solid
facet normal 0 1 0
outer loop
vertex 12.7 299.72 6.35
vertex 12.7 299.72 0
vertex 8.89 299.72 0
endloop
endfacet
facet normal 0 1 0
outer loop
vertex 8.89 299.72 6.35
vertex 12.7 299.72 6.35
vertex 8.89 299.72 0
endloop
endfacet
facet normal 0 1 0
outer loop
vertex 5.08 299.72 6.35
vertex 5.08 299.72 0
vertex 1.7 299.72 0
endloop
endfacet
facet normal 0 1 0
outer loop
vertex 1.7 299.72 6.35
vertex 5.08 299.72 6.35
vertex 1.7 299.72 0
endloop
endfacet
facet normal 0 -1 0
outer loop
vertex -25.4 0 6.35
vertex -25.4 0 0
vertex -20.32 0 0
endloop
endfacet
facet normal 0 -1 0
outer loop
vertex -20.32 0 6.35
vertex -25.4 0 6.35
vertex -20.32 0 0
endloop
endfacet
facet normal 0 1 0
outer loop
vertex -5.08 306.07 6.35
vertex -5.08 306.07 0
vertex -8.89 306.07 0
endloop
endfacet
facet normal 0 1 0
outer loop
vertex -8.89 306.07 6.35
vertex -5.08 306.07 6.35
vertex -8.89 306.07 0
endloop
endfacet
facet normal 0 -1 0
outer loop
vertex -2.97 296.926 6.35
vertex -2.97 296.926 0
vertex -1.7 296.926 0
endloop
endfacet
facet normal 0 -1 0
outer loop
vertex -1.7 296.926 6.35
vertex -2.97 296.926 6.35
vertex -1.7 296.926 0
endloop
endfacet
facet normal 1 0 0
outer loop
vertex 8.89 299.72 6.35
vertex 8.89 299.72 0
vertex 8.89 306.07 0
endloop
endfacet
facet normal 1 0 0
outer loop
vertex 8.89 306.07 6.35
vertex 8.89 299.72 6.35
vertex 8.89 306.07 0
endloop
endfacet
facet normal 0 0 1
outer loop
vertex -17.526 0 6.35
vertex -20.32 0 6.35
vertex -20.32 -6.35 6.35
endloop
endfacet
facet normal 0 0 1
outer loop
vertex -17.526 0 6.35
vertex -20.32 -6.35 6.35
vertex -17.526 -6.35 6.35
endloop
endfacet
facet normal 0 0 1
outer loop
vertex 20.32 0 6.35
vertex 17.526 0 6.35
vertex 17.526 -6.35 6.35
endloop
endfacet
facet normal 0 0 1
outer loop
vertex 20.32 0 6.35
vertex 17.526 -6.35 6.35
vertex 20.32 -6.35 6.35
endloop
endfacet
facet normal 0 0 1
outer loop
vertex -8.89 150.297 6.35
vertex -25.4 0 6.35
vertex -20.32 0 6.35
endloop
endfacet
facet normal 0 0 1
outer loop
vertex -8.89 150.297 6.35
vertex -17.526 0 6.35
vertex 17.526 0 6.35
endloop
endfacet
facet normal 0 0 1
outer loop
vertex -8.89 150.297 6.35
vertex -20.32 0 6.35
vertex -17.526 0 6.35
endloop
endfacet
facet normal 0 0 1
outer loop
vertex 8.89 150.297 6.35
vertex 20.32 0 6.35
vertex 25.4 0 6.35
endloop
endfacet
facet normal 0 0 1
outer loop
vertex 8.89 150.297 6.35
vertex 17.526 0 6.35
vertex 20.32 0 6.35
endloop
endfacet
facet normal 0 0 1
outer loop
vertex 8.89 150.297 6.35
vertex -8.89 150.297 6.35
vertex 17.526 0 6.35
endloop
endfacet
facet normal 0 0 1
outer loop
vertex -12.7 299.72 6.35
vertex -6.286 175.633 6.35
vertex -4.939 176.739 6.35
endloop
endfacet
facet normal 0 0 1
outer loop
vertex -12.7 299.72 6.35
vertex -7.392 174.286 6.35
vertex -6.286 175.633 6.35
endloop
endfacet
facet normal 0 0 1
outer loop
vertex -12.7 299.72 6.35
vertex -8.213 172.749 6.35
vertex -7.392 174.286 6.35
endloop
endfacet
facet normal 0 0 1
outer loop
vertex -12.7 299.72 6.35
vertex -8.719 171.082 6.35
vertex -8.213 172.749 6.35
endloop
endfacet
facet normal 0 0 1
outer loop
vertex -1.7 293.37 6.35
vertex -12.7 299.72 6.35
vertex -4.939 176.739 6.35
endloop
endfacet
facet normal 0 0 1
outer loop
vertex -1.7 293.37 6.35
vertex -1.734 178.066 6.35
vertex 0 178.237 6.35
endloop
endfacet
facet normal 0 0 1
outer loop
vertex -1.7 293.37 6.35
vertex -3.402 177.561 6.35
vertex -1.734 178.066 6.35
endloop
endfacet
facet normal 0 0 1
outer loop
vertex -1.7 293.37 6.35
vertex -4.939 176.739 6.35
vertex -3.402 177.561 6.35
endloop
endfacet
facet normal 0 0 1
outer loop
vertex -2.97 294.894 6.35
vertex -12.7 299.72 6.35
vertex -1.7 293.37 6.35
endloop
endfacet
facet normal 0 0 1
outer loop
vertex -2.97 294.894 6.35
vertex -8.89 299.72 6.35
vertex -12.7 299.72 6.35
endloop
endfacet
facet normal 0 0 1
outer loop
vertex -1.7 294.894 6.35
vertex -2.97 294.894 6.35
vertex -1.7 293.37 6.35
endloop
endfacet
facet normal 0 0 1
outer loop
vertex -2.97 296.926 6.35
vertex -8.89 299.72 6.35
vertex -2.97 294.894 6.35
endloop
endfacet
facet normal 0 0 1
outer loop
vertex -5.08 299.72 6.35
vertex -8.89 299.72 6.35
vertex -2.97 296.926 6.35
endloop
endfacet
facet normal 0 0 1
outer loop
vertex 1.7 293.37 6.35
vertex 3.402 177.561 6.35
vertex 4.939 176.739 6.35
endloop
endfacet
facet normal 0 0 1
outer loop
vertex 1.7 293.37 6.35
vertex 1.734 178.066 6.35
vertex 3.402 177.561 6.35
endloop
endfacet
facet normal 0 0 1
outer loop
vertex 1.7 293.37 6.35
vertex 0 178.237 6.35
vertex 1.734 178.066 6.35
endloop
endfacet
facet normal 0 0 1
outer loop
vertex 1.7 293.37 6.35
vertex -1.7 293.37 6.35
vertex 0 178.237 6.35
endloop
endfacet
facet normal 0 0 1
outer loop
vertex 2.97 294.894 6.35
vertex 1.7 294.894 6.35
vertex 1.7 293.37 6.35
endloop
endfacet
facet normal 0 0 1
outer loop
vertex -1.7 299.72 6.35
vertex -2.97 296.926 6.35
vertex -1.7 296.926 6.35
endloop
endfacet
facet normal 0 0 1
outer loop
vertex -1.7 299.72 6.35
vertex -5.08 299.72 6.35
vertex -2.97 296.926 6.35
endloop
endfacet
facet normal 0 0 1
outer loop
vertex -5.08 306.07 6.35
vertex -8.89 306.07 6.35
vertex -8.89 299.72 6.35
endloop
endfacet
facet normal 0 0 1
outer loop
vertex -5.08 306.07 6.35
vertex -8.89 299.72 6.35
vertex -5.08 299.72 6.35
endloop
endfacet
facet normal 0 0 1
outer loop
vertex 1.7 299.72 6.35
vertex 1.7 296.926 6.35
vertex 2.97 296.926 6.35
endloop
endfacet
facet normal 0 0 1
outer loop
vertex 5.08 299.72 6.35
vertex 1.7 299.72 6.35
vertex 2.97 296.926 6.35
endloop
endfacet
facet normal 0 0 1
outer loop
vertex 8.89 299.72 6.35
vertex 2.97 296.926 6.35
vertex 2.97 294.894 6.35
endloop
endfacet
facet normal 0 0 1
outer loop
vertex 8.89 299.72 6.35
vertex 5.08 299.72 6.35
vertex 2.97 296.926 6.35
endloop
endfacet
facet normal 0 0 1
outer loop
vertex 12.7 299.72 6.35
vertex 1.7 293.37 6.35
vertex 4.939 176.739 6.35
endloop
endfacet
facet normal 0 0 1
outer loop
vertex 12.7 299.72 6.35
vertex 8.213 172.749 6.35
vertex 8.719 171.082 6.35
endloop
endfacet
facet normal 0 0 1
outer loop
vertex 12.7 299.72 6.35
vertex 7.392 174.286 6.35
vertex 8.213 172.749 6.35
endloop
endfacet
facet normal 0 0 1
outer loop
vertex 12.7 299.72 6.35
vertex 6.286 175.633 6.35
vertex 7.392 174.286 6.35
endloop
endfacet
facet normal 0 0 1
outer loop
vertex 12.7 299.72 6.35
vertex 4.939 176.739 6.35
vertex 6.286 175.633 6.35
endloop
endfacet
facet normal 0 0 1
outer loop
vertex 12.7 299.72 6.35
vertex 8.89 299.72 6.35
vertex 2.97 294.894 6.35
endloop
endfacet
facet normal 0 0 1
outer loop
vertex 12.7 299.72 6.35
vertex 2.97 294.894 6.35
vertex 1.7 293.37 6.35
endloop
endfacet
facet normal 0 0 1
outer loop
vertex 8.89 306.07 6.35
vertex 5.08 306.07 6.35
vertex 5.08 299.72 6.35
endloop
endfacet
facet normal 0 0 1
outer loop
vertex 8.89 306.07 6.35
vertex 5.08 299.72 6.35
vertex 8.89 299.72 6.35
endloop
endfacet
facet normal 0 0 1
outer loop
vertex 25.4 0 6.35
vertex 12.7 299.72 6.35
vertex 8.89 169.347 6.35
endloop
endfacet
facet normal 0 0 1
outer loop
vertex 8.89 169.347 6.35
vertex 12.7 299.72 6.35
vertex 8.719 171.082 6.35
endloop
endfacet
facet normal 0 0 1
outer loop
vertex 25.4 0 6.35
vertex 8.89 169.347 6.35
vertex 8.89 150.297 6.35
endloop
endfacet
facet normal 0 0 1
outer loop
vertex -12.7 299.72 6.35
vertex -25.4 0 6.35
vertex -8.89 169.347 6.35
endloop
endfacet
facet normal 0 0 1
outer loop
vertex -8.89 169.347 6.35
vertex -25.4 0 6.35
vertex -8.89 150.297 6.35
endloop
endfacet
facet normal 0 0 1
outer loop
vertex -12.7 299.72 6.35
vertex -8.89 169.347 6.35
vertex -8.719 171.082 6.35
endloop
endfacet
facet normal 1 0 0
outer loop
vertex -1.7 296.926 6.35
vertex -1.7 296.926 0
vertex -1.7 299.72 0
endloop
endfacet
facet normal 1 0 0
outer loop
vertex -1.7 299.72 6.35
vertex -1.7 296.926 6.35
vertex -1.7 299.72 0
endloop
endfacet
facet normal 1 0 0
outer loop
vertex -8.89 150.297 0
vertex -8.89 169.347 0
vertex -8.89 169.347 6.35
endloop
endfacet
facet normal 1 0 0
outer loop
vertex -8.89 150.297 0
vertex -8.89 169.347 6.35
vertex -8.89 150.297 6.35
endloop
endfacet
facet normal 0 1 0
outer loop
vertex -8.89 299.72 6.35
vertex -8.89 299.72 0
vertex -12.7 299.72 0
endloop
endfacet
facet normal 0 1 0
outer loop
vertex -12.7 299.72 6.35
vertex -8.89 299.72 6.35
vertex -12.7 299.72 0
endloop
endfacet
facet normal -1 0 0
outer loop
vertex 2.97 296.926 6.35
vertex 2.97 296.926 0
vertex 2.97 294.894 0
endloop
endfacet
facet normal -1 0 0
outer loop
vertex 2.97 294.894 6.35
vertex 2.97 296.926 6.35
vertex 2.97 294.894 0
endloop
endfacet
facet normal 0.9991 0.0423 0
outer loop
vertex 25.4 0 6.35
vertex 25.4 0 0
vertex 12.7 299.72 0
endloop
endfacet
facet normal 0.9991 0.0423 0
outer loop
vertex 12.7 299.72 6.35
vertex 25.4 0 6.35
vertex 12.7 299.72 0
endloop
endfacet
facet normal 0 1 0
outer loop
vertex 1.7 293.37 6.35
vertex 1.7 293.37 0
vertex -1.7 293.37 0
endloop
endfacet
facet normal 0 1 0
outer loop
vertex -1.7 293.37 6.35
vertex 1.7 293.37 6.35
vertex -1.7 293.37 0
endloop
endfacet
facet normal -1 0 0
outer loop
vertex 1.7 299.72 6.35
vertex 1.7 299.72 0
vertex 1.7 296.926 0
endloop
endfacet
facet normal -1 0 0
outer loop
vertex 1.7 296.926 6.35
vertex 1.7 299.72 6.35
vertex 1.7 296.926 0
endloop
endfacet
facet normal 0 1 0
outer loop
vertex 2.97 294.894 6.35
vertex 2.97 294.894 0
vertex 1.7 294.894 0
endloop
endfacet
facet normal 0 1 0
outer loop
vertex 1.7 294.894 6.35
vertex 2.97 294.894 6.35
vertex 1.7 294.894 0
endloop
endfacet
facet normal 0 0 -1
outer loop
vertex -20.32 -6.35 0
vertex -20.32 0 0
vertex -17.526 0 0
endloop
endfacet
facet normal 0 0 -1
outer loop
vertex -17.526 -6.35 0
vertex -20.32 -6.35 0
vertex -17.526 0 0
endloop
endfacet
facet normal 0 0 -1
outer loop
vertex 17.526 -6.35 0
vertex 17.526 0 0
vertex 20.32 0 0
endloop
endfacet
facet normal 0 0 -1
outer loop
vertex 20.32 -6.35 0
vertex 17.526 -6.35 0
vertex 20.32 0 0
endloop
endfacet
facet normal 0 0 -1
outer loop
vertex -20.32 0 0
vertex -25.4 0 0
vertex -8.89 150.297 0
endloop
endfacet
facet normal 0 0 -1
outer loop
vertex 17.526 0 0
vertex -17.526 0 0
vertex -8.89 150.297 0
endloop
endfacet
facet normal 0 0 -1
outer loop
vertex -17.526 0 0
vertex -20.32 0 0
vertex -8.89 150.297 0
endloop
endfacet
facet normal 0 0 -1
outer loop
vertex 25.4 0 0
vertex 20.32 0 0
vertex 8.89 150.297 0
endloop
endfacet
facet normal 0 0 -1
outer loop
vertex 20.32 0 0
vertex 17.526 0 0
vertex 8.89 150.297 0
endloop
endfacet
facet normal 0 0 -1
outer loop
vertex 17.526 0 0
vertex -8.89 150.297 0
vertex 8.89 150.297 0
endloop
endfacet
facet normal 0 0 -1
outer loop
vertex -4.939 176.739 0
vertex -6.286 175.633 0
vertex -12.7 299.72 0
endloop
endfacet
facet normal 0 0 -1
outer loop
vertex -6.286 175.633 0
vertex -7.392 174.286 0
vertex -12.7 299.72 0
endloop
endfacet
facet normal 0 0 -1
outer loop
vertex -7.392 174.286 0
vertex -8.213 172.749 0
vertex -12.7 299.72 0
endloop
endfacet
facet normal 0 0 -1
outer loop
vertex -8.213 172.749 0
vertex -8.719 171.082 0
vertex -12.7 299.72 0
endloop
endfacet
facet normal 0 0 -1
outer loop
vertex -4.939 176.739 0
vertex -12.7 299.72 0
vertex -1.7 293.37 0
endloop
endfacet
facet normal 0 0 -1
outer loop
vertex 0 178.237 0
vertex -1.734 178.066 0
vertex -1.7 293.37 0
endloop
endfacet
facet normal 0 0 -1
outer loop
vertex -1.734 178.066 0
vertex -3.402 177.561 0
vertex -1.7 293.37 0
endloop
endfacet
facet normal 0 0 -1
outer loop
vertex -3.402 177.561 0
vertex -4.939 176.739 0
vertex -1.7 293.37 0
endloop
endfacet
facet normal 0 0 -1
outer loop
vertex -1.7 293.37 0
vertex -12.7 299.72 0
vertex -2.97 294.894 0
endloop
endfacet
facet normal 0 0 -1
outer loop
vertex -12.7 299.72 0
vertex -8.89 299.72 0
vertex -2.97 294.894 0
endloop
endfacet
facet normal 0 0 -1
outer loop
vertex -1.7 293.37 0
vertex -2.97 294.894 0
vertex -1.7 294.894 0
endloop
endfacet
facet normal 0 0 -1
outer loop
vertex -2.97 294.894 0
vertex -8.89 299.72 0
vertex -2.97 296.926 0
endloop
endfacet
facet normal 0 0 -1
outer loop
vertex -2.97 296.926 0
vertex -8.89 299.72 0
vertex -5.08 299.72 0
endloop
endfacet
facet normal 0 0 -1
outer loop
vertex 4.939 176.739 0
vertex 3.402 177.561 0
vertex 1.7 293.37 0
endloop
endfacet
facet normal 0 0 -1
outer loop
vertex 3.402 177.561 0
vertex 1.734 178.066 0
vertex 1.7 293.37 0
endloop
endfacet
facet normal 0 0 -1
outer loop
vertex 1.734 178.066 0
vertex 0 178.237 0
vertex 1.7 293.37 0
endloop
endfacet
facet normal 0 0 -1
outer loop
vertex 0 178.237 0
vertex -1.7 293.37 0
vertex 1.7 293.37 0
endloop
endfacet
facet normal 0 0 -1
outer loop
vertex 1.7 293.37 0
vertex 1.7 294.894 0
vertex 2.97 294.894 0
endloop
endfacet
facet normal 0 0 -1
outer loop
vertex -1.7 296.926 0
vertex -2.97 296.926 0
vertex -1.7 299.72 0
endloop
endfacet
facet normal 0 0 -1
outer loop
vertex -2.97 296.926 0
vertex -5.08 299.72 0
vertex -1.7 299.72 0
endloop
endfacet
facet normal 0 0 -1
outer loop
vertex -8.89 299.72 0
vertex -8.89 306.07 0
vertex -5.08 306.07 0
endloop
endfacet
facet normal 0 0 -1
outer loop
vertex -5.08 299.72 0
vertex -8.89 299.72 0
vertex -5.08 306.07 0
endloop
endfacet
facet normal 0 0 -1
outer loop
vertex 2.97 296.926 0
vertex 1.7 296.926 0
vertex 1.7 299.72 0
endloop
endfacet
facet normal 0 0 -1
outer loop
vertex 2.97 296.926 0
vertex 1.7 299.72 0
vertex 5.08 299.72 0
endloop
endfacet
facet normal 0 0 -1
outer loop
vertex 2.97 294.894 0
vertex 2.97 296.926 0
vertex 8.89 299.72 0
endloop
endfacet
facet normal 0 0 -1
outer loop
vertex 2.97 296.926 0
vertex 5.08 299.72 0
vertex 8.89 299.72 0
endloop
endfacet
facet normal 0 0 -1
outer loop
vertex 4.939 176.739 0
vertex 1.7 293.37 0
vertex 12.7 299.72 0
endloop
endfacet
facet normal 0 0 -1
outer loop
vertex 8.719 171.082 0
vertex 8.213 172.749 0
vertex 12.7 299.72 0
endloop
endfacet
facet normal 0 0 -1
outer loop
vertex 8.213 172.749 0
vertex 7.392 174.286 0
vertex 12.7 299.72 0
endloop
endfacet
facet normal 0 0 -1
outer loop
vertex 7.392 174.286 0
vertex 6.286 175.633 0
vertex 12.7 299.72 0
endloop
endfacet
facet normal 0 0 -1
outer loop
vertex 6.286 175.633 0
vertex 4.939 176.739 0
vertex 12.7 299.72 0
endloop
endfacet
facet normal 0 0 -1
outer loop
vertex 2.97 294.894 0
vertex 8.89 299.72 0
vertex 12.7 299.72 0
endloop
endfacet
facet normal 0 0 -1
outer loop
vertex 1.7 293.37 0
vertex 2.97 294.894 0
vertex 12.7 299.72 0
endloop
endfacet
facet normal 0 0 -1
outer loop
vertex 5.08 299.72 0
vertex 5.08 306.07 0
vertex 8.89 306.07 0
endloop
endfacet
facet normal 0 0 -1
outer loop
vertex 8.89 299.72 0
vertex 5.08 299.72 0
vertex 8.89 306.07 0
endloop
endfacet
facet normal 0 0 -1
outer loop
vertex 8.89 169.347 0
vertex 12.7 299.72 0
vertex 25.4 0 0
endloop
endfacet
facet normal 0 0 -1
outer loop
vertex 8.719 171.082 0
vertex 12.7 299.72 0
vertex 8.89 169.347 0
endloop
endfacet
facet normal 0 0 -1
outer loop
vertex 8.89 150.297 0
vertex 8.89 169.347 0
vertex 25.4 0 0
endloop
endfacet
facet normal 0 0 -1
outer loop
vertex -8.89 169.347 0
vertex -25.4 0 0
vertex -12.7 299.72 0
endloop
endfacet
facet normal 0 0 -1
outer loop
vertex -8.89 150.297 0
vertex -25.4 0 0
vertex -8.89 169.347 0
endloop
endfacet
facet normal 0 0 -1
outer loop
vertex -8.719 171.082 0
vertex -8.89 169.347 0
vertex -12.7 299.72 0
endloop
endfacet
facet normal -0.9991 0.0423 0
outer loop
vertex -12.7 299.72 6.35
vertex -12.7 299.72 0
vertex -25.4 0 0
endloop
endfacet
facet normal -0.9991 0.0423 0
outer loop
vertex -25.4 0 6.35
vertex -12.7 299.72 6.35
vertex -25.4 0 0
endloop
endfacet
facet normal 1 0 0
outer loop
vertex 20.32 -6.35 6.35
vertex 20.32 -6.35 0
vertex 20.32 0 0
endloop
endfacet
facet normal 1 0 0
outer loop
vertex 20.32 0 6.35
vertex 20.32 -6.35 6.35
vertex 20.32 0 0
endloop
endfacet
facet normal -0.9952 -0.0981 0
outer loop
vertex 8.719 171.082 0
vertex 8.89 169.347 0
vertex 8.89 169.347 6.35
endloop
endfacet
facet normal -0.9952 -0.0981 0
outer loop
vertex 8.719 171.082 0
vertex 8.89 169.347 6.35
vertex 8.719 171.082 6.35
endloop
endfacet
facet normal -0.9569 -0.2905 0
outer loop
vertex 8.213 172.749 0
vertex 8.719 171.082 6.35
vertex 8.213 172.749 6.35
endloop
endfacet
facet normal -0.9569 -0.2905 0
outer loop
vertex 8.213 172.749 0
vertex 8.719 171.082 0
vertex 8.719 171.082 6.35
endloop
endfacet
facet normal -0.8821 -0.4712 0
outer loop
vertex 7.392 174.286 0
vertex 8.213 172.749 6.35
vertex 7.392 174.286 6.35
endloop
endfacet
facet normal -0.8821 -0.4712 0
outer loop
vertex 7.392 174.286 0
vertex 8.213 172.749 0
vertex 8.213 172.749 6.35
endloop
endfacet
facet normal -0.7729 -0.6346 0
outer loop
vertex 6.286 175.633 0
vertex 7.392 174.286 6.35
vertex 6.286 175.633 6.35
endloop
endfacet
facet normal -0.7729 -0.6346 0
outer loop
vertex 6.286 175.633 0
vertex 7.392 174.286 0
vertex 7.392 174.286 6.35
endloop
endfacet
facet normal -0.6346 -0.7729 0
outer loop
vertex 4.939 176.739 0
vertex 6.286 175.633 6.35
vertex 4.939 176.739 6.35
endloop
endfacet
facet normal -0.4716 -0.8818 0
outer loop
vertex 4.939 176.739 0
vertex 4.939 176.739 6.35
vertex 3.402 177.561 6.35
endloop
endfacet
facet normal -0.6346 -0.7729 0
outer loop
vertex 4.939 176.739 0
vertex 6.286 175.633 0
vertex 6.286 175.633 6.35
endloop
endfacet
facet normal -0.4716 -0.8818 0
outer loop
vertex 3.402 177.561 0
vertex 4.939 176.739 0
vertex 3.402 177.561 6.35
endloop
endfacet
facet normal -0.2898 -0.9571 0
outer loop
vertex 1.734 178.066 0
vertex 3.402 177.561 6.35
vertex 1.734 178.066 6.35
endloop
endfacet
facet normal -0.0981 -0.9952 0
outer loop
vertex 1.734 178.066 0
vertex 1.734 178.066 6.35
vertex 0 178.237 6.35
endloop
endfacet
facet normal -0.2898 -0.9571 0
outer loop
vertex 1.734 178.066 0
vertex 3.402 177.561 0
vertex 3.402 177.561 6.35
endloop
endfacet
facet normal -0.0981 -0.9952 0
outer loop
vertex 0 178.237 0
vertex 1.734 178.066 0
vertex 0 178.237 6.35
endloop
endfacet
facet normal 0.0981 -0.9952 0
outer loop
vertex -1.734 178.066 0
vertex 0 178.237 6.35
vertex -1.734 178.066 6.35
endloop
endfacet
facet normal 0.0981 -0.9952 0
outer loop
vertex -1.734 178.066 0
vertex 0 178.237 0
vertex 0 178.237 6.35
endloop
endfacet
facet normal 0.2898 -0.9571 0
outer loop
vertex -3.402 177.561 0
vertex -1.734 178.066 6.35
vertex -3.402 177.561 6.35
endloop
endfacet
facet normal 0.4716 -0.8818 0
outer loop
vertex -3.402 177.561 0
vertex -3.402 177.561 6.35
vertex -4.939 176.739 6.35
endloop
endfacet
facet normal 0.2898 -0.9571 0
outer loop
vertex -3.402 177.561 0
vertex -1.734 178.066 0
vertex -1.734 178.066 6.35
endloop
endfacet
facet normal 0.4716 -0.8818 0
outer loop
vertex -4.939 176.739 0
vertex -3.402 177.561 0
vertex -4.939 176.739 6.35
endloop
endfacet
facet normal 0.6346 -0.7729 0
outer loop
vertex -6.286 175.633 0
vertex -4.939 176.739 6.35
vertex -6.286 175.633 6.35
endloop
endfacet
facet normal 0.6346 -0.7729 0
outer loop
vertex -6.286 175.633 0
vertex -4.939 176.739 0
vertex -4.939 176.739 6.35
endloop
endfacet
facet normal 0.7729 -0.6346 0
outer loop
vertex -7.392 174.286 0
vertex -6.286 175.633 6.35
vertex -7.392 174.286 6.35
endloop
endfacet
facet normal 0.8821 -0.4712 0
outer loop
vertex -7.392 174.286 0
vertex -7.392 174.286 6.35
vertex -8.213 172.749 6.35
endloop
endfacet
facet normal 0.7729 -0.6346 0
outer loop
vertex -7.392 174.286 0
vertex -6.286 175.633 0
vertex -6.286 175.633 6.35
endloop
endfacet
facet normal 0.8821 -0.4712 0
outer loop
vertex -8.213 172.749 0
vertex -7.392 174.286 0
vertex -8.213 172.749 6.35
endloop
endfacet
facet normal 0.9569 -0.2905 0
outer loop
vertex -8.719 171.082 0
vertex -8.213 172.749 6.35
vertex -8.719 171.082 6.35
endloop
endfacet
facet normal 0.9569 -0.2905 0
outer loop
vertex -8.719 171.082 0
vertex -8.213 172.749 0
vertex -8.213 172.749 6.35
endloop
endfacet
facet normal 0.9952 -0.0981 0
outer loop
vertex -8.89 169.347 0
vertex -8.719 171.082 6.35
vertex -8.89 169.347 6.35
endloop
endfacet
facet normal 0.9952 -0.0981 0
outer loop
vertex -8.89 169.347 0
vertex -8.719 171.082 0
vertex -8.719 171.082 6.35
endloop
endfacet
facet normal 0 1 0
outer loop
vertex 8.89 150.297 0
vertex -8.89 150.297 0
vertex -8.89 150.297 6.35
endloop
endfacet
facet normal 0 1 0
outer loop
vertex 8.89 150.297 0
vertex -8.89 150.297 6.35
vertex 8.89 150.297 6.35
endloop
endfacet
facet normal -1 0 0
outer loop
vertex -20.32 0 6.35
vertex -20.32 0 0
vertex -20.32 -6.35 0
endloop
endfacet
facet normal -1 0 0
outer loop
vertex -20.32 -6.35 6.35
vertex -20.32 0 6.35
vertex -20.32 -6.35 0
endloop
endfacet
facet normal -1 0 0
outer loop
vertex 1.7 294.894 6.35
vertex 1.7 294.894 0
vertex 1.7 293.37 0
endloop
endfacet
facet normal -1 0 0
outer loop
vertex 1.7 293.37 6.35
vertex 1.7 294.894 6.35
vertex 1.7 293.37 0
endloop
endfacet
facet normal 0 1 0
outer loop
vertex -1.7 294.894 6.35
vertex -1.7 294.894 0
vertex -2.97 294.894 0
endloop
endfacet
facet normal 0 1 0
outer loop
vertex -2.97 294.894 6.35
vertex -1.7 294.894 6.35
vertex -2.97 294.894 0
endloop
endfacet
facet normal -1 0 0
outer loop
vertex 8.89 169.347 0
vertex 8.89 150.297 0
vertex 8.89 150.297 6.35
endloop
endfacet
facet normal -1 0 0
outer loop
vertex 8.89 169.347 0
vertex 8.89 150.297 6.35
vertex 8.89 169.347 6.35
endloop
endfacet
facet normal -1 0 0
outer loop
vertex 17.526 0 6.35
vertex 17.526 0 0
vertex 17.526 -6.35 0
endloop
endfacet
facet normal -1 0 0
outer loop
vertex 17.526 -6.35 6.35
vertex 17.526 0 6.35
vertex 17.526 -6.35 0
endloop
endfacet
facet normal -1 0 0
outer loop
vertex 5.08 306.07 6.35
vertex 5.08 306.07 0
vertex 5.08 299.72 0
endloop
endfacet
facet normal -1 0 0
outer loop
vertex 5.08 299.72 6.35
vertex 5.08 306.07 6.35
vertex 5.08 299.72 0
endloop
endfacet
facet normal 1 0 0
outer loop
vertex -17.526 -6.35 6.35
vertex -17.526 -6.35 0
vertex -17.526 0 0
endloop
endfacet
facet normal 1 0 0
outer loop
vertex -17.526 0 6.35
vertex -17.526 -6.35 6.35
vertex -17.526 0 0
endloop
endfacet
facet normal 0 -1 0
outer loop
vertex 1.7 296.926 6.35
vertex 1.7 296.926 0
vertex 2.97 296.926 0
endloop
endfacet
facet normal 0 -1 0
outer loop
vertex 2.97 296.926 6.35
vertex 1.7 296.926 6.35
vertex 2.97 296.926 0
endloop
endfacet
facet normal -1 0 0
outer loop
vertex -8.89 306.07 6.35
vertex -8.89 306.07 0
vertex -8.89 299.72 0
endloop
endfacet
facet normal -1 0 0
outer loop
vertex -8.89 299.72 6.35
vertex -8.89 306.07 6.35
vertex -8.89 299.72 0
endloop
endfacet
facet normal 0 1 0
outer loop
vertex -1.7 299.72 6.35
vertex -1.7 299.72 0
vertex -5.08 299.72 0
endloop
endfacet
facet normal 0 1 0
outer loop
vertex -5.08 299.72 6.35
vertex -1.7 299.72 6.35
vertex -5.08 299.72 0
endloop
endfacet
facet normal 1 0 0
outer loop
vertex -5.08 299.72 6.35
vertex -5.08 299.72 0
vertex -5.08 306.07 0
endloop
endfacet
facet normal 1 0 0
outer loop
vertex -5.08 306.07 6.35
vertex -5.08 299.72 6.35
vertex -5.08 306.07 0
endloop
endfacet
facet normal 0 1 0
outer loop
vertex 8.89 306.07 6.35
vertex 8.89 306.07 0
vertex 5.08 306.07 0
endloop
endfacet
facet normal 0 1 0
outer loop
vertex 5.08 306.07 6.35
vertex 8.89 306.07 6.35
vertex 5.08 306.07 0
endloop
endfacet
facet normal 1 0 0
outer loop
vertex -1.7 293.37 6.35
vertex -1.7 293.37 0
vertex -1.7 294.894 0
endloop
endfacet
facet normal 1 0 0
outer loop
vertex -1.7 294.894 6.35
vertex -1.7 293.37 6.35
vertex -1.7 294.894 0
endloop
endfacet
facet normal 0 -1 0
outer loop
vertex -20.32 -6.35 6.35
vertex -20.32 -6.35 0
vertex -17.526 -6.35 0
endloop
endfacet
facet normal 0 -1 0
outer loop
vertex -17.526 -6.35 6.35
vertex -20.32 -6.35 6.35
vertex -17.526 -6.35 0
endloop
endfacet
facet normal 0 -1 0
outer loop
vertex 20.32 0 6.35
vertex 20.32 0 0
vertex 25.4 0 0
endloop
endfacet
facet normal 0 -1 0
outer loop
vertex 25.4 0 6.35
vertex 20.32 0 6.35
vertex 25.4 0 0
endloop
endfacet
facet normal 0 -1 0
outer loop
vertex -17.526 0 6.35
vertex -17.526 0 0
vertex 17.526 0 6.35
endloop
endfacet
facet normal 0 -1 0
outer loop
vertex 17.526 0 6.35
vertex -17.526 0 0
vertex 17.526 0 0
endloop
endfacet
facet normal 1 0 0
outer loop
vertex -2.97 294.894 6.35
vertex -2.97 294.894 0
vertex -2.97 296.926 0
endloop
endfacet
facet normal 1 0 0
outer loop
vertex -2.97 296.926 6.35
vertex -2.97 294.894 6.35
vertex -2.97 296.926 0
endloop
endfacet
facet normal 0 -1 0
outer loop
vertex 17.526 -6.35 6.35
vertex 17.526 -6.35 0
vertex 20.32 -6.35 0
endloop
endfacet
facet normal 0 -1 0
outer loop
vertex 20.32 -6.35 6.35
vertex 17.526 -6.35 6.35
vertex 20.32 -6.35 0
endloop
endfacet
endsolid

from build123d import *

# Parameters (mm, degrees)
BOSS_EXTRUDE1_DEPTH = 6.35


with BuildPart() as part:
    # Sketch1 → Boss-Extrude1 (new body)
    with BuildSketch(Plane.XY):
        Polygon((25.4, 0), (12.7, 299.72), (8.89, 299.72), (8.89, 306.07), (5.08, 306.07), (5.08, 299.72), (1.7, 299.72), (1.7, 296.926), (2.97, 296.926), (2.97, 294.894), (1.7, 294.894), (1.7, 293.37), (-1.7, 293.37), (-1.7, 294.894), (-2.97, 294.894), (-2.97, 296.926), (-1.7, 296.926), (-1.7, 299.72), (-5.08, 299.72), (-5.08, 306.07), (-8.89, 306.07), (-8.89, 299.72), (-12.7, 299.72), (-25.4, 0), (-20.32, 0), (-20.32, -6.35), (-17.526, -6.35), (-17.526, 0), (17.526, 0), (17.526, -6.35), (20.32, -6.35), (20.32, 0), align=None)
        with BuildLine():
            Line((-8.89, 150.297214184), (8.89, 150.297214184))
            Line((8.89, 150.297214184), (8.89, 169.347214184))
            ThreePointArc((8.89, 169.347214184), (0, 178.237214184), (-8.89, 169.347214184))
            Line((-8.89, 169.347214184), (-8.89, 150.297214184))
        make_face(mode=Mode.SUBTRACT)
    extrude(amount=BOSS_EXTRUDE1_DEPTH)


solid = part.part
